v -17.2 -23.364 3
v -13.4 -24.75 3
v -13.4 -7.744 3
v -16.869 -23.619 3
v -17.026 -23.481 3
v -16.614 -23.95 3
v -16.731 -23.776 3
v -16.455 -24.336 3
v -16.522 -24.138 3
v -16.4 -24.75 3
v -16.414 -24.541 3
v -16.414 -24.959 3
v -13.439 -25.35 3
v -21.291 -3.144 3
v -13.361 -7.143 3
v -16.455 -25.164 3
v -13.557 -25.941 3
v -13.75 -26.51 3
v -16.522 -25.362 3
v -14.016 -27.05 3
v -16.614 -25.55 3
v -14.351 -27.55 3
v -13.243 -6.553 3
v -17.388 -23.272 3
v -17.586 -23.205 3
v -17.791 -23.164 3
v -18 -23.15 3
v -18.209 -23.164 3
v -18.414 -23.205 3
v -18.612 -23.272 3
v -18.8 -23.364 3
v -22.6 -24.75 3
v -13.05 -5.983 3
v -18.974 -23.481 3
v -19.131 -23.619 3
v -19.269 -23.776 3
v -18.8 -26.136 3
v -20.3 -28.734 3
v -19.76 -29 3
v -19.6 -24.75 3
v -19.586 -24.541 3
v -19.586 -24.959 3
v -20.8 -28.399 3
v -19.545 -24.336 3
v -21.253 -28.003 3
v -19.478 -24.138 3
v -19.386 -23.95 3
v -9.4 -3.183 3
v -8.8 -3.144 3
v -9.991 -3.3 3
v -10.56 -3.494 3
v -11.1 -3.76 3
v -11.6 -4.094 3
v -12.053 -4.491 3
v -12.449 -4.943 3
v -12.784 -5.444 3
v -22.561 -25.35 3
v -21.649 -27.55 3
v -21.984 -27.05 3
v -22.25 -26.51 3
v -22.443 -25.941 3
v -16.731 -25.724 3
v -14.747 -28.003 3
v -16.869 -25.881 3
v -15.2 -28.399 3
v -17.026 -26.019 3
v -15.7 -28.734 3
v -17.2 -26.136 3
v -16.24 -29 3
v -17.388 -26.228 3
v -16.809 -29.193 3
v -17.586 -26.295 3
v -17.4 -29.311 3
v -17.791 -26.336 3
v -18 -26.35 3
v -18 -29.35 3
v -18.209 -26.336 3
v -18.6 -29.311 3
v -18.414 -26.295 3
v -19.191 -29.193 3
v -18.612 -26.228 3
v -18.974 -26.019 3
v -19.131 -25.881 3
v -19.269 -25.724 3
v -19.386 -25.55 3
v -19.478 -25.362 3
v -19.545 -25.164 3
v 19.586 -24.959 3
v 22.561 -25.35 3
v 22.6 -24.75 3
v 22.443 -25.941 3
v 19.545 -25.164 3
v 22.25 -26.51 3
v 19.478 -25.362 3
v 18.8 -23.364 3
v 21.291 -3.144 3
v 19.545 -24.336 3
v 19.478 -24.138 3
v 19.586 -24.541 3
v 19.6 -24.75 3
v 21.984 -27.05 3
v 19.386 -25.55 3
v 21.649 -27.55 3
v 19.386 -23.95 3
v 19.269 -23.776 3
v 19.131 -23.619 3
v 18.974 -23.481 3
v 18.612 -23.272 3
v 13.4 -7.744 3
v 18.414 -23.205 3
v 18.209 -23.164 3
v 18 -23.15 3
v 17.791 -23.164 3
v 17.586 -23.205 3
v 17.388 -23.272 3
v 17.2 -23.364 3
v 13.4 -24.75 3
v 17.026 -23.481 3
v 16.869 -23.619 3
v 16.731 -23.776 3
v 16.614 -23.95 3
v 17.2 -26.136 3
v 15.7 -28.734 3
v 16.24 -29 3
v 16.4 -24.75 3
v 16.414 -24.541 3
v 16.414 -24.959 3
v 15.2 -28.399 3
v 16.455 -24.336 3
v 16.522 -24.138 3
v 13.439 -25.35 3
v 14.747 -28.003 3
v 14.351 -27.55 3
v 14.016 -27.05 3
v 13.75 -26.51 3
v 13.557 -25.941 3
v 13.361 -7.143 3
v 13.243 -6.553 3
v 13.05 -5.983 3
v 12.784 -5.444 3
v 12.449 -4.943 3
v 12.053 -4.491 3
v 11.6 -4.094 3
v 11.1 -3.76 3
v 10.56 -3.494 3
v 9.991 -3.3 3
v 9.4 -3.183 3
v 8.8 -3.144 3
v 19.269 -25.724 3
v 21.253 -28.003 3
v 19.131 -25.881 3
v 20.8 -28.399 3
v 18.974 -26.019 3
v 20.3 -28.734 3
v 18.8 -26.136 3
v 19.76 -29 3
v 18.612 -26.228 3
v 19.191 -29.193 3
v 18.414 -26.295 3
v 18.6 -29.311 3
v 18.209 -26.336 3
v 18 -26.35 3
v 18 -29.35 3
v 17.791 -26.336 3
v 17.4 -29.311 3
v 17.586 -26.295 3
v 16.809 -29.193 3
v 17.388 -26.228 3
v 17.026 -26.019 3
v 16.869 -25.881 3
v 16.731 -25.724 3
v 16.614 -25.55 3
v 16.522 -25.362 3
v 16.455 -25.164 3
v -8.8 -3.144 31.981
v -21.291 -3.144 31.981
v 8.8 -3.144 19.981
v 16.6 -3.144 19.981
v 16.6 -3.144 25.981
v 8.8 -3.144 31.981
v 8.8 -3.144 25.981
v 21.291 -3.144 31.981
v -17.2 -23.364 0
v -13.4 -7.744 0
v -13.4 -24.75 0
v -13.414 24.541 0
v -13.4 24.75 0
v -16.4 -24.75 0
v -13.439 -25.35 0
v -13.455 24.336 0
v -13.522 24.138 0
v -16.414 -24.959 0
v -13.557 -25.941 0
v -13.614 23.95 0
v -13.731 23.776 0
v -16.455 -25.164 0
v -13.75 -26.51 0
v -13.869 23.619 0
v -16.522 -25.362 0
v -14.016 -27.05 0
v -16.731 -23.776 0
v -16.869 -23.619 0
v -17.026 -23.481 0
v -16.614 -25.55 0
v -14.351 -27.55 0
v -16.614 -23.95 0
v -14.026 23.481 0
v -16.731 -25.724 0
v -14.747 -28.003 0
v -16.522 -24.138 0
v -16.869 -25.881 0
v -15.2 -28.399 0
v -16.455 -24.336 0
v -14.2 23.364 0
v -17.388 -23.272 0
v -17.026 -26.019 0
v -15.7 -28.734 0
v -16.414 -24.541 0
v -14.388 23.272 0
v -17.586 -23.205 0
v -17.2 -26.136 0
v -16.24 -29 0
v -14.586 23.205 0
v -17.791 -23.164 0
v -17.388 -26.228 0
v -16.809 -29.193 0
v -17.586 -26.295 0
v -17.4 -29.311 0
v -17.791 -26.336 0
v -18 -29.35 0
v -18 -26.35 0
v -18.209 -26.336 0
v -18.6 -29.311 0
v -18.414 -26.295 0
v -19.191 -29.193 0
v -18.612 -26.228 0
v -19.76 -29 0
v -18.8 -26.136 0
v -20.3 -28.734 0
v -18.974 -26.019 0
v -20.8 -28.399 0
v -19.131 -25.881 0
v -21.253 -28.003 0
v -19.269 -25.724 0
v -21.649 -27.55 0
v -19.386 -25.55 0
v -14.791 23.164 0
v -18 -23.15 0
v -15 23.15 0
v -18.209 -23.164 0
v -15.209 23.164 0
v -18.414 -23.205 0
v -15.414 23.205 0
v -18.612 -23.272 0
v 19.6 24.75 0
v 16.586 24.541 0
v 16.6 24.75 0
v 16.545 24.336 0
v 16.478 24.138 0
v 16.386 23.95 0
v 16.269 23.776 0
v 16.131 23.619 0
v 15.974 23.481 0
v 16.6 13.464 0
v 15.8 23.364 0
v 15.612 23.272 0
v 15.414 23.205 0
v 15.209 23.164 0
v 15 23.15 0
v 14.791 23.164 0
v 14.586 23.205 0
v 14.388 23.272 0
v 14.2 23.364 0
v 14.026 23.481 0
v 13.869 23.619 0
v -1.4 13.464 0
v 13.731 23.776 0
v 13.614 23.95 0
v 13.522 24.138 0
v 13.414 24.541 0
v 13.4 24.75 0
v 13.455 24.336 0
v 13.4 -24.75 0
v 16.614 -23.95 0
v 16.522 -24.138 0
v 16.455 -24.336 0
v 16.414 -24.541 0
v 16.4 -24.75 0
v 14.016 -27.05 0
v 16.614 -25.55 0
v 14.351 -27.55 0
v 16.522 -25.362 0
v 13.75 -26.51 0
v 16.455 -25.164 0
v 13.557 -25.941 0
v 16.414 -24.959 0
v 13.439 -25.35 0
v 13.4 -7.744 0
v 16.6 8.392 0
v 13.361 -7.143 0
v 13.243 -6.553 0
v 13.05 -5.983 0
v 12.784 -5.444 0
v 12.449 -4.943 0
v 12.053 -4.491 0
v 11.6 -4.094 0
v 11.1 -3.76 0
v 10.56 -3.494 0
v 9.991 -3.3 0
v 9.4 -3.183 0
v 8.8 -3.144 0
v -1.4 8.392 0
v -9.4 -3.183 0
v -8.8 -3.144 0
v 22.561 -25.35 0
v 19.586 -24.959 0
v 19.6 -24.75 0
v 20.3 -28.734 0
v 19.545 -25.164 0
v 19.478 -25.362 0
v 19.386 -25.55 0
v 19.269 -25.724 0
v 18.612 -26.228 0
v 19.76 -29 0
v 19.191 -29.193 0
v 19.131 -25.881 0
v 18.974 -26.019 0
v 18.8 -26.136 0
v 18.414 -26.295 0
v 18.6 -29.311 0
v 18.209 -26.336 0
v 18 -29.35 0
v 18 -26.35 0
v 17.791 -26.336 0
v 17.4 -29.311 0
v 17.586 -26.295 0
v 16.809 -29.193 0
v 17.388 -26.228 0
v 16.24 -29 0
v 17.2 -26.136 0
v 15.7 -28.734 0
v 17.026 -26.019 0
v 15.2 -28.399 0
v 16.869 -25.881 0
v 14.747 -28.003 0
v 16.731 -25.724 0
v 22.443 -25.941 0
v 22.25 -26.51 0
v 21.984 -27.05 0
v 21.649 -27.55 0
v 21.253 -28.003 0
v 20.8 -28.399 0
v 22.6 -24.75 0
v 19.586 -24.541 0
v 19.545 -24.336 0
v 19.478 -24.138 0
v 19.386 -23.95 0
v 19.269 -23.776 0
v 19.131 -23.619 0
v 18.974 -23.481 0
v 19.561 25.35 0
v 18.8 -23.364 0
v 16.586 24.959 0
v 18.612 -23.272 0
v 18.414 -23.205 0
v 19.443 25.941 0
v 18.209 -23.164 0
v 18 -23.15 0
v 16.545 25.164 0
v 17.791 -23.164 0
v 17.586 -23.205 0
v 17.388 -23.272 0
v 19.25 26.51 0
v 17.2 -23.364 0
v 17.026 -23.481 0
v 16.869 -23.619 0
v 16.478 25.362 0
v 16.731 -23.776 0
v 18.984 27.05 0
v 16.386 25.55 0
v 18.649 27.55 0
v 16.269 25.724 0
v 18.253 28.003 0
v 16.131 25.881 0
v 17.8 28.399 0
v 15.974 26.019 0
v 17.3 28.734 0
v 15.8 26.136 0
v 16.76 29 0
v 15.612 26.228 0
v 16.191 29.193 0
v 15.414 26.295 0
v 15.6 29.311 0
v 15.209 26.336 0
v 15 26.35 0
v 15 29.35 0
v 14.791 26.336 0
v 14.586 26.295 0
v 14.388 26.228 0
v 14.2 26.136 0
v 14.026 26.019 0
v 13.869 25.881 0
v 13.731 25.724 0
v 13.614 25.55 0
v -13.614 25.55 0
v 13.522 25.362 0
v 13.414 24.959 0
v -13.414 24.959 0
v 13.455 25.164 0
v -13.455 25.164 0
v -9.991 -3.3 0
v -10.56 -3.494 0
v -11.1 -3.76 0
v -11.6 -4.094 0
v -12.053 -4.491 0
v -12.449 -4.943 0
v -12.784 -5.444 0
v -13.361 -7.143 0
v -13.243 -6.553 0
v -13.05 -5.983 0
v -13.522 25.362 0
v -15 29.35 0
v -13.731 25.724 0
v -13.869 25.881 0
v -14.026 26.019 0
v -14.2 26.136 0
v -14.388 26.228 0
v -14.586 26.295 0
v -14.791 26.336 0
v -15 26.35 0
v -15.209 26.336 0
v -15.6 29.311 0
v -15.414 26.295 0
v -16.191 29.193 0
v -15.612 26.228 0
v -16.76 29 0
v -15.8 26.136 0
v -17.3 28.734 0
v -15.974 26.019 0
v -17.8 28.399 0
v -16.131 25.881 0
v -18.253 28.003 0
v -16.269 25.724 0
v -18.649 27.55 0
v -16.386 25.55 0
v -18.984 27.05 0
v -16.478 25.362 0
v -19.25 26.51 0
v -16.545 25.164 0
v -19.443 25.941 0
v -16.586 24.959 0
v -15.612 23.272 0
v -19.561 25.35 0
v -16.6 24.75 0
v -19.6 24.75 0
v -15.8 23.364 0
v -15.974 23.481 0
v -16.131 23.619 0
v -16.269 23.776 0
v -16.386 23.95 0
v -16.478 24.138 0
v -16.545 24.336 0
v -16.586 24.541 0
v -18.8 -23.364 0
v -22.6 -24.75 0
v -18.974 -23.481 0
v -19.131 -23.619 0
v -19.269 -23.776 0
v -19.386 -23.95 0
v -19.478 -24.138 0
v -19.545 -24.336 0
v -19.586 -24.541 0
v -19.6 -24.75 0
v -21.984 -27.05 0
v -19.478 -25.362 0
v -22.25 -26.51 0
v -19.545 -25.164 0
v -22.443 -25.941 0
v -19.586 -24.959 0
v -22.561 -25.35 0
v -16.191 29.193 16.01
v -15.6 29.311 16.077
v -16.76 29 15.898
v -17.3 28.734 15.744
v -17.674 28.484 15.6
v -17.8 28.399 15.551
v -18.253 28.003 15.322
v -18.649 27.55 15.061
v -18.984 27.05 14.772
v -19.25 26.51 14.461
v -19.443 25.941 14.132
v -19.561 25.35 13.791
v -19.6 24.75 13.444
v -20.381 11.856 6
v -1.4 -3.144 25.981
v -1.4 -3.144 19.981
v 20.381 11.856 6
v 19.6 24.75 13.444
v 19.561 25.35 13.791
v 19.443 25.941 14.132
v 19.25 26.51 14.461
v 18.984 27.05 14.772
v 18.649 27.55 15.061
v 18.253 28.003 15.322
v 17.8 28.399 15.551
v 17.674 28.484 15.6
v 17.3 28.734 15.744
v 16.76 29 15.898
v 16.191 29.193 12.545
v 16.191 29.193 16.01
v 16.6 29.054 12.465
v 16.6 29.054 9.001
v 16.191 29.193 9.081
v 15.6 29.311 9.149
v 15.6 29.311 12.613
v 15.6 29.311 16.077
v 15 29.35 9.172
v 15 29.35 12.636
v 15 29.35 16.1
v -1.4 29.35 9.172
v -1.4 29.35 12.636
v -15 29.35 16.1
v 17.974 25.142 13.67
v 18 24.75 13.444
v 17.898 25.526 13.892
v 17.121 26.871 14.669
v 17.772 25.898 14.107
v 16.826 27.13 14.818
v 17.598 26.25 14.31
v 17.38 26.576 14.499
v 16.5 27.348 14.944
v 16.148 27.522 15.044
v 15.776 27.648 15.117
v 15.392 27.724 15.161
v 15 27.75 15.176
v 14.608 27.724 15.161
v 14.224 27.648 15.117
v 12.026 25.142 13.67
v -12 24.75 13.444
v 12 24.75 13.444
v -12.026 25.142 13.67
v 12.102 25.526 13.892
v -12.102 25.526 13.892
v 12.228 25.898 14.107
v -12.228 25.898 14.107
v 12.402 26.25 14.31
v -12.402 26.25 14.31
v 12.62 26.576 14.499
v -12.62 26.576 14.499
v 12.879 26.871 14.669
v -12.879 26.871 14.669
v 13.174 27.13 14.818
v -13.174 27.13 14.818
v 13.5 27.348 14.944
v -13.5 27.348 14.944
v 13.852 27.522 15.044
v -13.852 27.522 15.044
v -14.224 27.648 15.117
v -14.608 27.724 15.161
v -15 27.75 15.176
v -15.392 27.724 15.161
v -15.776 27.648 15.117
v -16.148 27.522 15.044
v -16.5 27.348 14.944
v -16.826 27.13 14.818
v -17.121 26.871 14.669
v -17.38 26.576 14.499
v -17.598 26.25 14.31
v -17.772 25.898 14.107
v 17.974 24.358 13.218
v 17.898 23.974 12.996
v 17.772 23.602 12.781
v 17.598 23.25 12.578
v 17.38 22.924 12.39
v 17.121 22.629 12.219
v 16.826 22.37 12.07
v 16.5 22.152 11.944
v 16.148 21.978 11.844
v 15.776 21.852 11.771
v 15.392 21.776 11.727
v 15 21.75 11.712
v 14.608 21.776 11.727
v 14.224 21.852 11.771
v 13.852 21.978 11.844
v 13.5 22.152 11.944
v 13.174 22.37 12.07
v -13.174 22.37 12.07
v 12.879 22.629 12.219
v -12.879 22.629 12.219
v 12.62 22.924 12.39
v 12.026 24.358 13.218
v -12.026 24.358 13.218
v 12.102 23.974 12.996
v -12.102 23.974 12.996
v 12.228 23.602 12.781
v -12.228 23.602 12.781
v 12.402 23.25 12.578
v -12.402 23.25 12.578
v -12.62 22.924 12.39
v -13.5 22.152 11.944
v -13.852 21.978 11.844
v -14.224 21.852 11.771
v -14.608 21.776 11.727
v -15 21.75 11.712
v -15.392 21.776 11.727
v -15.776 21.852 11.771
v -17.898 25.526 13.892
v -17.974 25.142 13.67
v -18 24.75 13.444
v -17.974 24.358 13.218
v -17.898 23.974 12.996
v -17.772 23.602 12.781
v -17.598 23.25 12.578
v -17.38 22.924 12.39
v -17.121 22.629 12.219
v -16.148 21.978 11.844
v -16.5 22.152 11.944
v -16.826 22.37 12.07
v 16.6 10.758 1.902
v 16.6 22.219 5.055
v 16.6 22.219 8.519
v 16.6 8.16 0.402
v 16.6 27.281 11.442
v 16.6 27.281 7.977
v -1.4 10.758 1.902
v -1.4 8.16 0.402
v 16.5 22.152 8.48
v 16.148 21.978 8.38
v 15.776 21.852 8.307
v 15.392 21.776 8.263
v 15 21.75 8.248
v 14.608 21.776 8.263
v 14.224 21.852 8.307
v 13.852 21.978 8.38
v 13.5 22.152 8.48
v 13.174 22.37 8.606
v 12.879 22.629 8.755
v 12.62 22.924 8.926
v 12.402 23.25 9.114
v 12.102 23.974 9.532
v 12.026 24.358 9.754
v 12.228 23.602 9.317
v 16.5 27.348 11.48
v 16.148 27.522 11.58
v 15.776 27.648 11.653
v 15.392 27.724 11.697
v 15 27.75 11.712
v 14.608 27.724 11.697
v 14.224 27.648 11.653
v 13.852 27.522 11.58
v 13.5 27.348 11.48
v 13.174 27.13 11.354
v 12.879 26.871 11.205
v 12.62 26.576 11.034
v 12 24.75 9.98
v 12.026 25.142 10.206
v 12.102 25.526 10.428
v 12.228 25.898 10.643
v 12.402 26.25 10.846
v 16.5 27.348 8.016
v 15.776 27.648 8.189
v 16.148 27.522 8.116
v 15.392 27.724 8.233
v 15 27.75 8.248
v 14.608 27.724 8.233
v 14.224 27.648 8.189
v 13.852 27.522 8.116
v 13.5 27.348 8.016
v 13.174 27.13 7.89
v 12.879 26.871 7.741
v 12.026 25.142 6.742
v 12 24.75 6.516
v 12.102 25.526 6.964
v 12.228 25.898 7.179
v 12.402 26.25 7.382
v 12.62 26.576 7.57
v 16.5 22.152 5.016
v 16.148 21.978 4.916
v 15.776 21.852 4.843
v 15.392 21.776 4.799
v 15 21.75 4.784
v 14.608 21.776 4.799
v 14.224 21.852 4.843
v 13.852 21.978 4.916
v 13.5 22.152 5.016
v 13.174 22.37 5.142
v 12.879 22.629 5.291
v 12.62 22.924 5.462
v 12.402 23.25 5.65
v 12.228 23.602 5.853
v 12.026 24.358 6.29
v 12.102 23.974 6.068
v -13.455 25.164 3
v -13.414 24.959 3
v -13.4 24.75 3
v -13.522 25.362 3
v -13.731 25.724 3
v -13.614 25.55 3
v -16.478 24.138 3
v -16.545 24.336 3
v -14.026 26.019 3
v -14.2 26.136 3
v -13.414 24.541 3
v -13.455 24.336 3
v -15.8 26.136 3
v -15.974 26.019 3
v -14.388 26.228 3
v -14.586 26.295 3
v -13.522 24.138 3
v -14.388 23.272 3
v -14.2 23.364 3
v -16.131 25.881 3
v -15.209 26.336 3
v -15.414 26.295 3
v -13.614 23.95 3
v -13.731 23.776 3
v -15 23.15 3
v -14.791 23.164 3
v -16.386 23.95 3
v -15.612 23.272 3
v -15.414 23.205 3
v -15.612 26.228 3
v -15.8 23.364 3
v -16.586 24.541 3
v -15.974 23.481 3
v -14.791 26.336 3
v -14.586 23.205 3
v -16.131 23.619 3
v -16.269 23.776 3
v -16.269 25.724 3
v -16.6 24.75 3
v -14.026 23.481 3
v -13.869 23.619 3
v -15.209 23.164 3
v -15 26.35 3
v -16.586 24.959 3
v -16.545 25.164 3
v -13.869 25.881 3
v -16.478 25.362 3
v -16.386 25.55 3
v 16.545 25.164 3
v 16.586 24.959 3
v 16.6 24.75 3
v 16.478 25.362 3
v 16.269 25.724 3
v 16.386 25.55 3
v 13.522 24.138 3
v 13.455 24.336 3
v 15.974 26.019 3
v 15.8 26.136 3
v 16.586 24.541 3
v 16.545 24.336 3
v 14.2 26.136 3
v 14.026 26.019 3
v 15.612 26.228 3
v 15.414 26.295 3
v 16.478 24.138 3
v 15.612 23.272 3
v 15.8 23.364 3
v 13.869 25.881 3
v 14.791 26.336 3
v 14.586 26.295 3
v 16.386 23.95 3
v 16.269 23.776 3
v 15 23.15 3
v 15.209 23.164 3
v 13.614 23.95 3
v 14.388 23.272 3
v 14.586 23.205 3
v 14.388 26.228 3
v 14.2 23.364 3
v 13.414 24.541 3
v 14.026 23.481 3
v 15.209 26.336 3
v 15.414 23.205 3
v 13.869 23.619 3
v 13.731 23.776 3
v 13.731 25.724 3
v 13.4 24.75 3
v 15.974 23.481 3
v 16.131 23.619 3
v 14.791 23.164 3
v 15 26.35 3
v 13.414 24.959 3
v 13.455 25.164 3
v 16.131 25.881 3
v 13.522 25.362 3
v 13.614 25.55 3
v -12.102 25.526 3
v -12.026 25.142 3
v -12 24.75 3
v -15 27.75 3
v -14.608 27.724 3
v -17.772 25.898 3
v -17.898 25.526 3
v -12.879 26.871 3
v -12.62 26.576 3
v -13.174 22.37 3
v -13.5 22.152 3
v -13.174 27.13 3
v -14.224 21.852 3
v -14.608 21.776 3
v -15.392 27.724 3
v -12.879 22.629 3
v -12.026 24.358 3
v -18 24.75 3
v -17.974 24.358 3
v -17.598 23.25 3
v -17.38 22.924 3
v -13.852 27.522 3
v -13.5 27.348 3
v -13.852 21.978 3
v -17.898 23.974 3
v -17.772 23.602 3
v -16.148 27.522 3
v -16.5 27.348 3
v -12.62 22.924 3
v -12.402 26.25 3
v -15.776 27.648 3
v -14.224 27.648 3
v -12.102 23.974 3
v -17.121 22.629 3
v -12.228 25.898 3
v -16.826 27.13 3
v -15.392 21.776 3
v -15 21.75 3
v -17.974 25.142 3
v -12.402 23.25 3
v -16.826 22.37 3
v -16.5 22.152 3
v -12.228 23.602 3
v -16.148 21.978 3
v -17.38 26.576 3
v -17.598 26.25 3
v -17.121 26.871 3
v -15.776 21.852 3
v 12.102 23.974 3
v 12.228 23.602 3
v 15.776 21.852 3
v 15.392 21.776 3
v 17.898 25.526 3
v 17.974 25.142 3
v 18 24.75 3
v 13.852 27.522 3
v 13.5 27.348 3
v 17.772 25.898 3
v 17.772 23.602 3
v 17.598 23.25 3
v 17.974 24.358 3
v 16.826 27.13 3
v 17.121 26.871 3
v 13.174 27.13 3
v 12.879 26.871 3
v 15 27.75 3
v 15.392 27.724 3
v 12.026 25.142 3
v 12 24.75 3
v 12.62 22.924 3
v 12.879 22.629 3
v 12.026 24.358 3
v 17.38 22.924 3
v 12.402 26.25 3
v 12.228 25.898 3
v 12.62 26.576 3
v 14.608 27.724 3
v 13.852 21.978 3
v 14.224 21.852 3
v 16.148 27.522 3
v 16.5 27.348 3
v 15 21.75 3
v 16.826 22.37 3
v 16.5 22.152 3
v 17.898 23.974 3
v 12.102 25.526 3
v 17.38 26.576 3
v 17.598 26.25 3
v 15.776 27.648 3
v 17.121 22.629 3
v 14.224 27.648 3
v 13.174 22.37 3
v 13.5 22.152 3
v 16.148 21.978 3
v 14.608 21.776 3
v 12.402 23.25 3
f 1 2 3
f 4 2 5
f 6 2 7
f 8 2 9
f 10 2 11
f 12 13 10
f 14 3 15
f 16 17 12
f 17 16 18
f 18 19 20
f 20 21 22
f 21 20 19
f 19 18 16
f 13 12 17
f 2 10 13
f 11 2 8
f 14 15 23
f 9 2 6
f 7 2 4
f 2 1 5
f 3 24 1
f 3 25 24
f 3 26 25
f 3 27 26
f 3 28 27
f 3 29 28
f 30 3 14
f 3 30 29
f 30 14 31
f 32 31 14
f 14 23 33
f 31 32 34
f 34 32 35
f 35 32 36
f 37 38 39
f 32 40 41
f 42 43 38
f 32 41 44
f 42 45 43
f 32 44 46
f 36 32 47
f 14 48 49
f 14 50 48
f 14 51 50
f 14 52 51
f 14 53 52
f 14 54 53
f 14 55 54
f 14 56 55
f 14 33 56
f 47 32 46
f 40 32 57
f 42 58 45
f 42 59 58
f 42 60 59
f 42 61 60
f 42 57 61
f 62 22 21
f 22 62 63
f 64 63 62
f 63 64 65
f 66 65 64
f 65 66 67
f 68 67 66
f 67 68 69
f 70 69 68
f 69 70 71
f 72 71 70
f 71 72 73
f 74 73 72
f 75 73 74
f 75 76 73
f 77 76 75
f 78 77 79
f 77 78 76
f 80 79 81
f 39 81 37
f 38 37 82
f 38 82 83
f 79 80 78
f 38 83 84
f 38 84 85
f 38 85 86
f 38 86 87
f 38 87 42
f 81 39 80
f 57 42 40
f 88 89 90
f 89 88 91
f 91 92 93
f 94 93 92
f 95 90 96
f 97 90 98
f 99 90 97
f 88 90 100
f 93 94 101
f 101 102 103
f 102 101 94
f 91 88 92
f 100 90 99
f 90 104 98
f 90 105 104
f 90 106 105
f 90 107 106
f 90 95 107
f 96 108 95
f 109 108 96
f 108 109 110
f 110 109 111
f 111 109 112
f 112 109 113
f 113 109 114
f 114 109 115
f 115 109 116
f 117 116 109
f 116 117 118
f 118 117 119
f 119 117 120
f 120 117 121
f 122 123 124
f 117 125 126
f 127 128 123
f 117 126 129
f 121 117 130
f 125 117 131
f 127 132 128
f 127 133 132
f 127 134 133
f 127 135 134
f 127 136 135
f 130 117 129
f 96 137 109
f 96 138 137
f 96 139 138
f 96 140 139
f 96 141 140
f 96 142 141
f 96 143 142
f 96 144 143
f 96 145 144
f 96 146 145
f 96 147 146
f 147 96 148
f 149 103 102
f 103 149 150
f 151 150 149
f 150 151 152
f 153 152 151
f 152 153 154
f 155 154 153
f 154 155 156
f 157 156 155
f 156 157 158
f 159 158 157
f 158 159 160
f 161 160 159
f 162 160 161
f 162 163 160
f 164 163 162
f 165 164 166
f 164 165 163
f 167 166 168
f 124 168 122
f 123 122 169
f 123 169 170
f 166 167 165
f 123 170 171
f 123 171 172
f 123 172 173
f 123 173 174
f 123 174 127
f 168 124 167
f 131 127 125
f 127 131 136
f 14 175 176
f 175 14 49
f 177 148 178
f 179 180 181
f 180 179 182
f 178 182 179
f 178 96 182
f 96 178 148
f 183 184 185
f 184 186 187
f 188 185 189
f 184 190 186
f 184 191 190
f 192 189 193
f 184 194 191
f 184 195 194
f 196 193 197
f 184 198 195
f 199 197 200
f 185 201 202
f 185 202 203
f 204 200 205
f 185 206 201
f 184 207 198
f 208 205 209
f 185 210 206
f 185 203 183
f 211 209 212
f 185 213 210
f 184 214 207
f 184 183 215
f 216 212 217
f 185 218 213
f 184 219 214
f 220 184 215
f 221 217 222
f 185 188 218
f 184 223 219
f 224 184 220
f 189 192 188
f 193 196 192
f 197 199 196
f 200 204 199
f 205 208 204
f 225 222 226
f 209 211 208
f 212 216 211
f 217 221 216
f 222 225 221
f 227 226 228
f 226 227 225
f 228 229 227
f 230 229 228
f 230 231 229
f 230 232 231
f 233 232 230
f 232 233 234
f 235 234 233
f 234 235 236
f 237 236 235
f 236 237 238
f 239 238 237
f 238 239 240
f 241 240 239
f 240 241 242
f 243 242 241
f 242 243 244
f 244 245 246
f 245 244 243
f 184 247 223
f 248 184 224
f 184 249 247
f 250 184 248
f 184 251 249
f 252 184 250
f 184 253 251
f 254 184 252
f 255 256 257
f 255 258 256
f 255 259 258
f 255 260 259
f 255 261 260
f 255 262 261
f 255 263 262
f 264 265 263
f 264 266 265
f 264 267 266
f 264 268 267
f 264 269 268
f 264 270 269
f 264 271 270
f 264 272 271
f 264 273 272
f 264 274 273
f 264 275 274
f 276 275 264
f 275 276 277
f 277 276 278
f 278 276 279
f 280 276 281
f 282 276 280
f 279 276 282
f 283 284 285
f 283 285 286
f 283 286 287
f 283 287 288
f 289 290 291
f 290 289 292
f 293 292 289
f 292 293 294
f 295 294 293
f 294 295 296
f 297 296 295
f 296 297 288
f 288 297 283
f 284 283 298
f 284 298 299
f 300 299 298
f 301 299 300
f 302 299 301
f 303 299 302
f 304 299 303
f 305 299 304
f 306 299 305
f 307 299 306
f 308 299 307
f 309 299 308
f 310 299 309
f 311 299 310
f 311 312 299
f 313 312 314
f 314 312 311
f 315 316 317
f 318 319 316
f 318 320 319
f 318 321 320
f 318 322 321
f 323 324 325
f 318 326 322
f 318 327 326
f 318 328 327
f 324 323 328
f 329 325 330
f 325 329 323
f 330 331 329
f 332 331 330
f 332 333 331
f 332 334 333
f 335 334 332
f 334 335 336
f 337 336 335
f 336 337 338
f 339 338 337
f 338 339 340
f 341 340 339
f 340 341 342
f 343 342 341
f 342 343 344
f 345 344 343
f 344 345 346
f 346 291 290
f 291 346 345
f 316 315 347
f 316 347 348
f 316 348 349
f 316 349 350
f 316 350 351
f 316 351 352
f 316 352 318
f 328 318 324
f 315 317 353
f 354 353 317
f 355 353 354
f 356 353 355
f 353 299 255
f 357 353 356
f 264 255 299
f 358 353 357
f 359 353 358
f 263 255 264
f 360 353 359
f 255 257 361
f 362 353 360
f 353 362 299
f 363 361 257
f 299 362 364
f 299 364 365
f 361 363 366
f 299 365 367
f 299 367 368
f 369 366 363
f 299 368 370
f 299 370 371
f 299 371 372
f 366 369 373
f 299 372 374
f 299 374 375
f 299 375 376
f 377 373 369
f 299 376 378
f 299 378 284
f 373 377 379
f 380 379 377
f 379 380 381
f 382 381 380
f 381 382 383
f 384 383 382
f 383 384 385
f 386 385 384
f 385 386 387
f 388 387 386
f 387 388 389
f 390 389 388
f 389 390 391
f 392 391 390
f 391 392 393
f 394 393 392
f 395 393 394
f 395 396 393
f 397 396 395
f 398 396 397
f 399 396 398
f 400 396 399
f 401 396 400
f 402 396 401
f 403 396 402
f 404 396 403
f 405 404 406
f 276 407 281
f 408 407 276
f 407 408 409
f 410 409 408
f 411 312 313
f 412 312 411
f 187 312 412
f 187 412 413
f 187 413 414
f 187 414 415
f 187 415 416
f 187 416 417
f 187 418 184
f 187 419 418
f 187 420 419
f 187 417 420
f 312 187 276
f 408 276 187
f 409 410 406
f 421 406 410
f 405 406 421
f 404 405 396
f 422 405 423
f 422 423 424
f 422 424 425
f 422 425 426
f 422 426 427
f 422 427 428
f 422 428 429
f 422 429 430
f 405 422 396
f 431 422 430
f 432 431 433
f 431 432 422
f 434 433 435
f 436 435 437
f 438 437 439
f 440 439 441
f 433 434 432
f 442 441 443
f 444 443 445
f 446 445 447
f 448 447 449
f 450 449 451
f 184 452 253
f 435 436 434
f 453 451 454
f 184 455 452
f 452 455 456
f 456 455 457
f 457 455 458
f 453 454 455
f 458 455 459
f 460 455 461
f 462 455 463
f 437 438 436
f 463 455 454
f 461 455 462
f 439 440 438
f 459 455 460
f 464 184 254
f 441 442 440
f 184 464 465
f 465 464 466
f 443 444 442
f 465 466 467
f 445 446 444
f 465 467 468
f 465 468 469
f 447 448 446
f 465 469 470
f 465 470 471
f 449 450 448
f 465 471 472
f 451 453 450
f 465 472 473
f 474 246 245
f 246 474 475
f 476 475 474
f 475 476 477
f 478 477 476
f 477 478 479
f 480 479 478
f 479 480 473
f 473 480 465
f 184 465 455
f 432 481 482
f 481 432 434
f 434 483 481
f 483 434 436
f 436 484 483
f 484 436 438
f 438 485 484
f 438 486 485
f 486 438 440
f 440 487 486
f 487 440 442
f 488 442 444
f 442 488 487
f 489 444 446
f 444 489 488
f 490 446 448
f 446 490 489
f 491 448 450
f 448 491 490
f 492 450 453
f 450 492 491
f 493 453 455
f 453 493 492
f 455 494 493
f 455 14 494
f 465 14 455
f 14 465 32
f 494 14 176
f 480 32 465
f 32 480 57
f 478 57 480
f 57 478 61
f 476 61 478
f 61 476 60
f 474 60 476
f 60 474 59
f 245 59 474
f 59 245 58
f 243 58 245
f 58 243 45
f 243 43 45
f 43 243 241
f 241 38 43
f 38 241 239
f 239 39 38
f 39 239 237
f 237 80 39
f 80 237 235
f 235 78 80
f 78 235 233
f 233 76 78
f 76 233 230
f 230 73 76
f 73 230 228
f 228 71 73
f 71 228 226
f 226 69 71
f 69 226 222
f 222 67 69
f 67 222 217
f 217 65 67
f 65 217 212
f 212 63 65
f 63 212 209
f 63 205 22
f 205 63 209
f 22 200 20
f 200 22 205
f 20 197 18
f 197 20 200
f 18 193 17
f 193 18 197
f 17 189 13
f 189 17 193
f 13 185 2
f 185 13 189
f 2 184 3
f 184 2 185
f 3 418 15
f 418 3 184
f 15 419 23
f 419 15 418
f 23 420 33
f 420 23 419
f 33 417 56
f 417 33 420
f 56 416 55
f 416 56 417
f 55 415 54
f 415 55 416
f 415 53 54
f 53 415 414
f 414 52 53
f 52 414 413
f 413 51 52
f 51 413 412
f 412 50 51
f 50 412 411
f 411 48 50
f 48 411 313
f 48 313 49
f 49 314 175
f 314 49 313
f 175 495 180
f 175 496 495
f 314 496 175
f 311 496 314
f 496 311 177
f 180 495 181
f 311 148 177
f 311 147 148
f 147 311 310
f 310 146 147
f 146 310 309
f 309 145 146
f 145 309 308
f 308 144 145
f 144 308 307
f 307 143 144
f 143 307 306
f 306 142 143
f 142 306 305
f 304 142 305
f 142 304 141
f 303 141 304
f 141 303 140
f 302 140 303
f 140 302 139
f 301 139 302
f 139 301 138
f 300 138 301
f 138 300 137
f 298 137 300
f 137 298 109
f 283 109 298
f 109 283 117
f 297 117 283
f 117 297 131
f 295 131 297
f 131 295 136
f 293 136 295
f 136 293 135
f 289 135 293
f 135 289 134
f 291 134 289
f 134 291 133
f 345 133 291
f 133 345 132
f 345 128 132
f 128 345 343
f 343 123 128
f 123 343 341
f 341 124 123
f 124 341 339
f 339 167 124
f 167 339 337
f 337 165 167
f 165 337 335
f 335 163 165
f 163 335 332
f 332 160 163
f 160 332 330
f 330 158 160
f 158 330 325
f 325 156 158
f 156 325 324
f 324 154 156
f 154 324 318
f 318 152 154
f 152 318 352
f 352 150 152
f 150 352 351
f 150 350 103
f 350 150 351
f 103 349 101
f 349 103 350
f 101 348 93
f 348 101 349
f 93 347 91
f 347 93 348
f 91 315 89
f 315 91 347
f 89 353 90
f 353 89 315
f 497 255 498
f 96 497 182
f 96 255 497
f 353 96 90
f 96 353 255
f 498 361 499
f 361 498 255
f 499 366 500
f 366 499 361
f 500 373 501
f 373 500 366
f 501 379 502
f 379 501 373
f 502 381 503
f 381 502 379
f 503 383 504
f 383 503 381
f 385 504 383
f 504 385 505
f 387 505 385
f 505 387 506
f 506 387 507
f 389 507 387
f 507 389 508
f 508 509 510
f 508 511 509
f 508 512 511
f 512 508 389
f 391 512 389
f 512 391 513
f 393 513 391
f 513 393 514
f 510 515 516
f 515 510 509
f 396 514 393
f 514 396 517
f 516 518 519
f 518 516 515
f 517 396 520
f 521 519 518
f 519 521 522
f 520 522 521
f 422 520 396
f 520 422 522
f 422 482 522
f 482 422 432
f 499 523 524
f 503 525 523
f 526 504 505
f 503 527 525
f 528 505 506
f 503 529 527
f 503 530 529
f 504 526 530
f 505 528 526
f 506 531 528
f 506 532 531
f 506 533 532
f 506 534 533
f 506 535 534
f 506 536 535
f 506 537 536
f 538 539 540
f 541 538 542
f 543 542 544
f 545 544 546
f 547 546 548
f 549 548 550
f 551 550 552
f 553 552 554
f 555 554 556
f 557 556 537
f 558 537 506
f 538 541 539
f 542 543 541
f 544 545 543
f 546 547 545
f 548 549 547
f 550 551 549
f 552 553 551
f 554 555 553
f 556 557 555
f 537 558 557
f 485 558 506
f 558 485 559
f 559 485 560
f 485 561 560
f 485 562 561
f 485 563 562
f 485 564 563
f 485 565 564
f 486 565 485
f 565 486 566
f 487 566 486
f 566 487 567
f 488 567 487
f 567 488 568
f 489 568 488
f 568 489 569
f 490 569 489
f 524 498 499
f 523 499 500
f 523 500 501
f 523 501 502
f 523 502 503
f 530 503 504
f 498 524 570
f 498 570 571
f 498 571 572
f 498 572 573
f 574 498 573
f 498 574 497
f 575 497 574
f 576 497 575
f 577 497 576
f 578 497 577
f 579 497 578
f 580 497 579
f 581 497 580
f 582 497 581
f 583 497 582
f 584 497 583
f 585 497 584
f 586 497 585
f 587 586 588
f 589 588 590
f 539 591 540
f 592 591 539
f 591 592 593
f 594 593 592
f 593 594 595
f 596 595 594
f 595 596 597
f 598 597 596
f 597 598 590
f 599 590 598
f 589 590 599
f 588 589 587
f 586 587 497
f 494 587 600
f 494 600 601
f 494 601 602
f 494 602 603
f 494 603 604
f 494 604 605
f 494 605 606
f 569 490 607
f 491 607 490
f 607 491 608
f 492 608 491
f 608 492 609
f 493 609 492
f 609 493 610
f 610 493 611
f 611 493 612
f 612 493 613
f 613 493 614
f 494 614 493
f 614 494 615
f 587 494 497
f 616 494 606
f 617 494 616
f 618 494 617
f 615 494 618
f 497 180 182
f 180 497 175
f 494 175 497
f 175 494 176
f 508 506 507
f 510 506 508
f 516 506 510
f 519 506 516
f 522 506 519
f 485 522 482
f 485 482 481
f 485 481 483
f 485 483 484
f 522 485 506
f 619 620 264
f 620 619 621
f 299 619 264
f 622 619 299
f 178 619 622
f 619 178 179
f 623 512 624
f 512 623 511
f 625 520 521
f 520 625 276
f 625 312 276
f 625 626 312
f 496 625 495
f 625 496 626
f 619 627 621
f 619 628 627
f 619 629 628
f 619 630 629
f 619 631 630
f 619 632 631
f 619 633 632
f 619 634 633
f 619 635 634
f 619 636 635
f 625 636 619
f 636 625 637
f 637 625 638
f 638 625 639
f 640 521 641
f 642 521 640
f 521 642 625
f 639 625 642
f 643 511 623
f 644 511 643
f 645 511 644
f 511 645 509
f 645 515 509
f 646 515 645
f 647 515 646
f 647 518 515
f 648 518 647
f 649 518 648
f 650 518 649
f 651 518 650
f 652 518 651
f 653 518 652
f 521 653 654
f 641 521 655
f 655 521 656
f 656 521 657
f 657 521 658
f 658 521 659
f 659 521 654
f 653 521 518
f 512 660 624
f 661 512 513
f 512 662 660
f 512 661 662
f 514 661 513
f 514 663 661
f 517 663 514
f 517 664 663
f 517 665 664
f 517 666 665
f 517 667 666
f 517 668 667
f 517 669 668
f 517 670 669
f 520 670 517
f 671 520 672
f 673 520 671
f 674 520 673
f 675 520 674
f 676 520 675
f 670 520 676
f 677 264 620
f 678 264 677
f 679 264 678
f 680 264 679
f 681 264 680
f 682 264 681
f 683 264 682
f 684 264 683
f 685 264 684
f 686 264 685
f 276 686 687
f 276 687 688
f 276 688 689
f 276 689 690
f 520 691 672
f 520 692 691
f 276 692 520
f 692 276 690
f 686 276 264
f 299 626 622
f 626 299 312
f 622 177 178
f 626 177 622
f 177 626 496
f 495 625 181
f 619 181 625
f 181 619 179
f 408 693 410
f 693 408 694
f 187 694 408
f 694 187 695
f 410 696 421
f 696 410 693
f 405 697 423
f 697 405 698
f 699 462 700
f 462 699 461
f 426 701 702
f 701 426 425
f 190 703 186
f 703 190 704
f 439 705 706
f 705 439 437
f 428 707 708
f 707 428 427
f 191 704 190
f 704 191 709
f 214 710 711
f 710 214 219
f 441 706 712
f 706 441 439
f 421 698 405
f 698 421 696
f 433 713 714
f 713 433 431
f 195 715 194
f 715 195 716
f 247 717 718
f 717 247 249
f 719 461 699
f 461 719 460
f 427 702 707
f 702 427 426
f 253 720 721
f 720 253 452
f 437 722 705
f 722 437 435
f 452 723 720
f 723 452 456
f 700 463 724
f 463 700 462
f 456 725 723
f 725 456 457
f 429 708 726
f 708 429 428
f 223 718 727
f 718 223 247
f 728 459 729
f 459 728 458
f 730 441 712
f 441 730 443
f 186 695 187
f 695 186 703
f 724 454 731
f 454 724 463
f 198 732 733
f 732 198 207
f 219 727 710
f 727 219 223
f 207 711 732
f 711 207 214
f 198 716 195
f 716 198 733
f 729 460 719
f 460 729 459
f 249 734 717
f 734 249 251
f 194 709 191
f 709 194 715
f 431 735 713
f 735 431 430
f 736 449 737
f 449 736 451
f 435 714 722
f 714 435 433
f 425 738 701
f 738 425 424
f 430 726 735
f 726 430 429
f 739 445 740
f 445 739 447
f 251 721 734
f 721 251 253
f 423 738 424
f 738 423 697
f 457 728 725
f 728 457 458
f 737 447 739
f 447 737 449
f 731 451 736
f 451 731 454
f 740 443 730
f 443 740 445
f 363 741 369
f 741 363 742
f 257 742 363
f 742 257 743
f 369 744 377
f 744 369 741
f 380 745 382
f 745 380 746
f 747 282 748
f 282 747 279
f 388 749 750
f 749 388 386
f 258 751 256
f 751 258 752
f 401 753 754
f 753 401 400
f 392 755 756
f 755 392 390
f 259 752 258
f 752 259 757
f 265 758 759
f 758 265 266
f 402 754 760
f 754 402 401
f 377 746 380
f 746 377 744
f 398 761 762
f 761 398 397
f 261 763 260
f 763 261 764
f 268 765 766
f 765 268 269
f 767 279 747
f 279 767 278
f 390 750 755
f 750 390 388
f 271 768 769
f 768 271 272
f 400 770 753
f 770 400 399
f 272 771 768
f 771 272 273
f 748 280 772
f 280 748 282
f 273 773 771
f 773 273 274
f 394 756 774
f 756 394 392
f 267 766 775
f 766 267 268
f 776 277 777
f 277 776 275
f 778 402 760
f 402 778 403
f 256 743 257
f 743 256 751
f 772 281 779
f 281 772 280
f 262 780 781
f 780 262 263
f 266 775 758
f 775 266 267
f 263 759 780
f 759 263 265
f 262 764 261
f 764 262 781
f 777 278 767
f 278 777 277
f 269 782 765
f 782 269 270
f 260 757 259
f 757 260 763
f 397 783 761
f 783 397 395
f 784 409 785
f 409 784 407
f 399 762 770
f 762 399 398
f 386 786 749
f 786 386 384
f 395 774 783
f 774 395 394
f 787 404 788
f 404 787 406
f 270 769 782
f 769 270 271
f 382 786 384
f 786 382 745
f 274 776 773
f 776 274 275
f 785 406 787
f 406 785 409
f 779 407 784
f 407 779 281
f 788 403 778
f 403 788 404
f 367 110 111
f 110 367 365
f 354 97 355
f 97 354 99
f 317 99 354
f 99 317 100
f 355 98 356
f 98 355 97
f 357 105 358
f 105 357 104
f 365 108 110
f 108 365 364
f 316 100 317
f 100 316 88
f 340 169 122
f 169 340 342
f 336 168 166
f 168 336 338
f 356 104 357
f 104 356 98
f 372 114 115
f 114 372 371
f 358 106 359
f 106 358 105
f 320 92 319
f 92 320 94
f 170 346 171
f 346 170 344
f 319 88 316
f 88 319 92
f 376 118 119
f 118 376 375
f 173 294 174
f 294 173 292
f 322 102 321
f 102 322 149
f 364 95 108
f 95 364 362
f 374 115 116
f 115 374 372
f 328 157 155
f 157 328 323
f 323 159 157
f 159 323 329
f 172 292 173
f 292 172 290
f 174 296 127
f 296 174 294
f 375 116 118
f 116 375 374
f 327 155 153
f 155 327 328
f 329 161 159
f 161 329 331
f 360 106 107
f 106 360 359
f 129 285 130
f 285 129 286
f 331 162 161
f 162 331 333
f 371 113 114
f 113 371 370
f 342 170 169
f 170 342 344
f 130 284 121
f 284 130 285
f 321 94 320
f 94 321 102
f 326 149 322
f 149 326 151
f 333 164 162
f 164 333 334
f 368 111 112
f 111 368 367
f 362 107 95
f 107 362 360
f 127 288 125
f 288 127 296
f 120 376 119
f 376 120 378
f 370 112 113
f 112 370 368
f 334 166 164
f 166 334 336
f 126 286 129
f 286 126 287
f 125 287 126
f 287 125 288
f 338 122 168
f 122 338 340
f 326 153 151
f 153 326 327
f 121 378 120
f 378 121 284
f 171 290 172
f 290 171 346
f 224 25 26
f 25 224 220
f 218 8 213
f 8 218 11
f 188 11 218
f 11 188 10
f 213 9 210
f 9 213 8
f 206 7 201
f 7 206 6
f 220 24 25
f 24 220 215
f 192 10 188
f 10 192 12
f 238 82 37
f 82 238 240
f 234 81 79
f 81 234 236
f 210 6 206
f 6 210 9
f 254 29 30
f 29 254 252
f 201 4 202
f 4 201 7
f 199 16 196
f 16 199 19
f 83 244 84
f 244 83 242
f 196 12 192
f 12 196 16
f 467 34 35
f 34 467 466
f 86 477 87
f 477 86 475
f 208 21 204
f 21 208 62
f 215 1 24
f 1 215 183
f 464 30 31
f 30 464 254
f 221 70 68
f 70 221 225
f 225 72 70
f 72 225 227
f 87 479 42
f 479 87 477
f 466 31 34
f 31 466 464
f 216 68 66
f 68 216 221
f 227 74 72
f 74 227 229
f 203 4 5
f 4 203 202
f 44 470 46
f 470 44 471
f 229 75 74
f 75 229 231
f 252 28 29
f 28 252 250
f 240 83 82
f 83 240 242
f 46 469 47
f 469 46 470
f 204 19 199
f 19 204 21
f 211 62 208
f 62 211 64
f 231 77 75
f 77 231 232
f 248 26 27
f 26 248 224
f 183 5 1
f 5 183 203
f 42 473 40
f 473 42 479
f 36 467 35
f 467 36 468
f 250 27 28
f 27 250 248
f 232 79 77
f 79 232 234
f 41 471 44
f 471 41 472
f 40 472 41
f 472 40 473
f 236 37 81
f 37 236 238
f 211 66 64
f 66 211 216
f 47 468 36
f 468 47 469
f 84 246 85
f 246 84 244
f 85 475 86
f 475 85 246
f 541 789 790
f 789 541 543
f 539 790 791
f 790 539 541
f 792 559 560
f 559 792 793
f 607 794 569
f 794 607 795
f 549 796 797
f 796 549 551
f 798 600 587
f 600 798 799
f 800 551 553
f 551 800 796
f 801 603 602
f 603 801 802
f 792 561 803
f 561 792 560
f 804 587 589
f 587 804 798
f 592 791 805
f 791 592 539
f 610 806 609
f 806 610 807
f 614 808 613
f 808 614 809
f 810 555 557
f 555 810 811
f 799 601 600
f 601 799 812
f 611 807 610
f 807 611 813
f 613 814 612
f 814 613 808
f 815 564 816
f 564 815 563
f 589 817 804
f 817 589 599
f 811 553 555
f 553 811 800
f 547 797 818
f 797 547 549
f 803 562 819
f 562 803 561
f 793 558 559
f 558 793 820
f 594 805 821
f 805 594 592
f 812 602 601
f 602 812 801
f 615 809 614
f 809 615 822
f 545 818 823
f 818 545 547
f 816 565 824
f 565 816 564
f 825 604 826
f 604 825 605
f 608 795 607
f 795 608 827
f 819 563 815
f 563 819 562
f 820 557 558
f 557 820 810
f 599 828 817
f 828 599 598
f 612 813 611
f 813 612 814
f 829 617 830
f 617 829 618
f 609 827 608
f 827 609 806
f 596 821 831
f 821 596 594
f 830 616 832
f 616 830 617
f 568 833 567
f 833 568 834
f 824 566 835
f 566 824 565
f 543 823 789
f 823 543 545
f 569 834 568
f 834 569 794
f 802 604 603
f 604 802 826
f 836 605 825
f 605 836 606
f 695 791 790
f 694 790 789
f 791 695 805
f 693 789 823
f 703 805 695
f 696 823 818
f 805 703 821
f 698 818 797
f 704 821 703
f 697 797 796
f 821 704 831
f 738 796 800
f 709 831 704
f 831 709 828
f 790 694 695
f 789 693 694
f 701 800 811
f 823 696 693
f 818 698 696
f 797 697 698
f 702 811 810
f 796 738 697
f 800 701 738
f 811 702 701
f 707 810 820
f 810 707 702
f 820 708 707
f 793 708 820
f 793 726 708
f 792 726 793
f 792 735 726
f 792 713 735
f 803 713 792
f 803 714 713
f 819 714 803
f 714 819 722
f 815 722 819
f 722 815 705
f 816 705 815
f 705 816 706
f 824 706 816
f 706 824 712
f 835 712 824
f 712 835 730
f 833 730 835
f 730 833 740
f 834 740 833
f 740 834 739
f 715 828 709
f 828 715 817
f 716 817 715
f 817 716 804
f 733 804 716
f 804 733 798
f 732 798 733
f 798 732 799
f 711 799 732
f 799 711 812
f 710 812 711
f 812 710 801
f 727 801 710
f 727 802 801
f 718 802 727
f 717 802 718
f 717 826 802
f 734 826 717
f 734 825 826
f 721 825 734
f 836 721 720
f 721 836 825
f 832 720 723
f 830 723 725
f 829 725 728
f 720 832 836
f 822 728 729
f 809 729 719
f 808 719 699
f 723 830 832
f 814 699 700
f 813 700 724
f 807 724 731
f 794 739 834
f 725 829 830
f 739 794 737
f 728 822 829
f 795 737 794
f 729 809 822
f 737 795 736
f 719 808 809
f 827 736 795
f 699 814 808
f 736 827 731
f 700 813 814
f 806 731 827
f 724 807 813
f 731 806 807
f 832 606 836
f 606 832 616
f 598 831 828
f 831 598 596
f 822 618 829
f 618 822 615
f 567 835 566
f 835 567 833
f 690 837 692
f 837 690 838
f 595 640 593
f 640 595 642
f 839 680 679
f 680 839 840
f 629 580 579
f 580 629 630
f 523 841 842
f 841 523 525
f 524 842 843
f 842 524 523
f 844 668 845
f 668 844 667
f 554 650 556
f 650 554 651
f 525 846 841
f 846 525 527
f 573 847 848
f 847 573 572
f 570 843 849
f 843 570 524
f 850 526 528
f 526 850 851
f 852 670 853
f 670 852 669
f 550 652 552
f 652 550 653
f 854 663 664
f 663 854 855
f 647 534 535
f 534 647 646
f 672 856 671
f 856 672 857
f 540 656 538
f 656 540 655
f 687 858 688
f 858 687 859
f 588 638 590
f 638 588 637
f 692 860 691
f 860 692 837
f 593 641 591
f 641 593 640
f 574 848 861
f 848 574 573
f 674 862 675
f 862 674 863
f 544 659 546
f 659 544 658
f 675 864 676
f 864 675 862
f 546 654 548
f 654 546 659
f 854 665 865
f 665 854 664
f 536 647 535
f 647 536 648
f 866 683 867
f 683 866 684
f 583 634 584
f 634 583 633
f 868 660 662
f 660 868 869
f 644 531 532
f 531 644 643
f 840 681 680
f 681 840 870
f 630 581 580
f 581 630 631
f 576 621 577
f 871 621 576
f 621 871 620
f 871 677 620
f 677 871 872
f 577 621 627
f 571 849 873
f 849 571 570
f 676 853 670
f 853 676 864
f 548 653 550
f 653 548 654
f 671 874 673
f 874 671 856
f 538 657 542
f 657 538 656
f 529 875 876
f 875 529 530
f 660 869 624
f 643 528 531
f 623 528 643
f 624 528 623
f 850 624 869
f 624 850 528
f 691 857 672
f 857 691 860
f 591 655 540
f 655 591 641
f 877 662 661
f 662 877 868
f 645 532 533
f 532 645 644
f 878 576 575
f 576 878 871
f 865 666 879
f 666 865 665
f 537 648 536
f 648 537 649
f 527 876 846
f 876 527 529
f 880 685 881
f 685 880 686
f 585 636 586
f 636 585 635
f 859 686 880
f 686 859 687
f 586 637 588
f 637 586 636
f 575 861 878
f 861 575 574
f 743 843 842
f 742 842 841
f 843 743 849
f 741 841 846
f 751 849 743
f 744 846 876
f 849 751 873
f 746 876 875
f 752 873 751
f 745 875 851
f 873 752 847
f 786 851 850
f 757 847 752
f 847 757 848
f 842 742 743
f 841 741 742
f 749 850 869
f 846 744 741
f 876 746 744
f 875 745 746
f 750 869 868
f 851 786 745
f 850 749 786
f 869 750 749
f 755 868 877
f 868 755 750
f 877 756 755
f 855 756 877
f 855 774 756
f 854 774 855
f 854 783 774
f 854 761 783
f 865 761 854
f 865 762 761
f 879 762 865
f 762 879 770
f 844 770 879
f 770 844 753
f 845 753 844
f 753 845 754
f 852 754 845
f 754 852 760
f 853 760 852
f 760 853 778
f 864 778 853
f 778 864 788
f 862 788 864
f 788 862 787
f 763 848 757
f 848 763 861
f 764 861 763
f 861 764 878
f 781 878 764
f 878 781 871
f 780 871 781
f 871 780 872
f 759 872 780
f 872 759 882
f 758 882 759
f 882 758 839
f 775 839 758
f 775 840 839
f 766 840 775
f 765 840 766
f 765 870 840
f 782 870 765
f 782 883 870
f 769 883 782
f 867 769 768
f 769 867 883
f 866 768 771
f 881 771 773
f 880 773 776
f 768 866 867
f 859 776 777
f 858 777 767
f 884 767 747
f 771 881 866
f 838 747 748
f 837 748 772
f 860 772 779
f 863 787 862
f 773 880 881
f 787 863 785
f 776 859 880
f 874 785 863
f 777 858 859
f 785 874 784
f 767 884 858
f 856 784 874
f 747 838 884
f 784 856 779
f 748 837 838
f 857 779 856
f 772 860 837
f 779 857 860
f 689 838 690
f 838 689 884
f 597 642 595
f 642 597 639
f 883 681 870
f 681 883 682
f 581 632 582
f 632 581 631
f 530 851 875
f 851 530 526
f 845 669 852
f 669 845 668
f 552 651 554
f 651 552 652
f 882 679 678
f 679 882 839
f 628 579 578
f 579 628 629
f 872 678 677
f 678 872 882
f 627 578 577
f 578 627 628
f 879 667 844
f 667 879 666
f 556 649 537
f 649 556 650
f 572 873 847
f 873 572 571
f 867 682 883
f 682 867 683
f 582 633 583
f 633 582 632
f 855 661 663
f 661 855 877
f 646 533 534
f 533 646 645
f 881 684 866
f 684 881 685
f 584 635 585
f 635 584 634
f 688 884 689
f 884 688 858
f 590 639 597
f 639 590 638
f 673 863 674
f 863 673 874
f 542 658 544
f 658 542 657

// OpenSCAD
//Depth of camera
camera_depth = 20.2;
//Height of the supporting back
back_height = 30;
//C/C Distance between front holes
front_cc = 30;
//C/C Distance between rear holes
rear_cc = 36;
//C/C Distance between front and rear holes
front_rear_cc = 49.5;
//angle of camera
angle = 30; //[10:45]
//Thickness of the base
base_thickness = 3;
//Hole diameter (may need adjustment depending on printer)
hole_size = 3.2;
//Determines the amount of "meat" around the holes
edge_margin = 3;
//Diameter of screw head (to allow enough clerance)
screw_head_size = 6;
//Wedge offset from front
front_offset = 0;
//Add lip to fron of wedge
use_lip = "No"; //[Yes,No]
//Velcro strap width
velcro_width = 18;
//Velcro strap thickness
velcro_thickness = 3;
//Added height under the camera e.g. for prop clearence
added_height = 0;


//Calculated variables wont be visible to Thingiverse customizer
hole_clearence = edge_margin+hole_size/2;
screw_head_clerance = screw_head_size / 2;
hole_radius = hole_size / 2;
lip_thickness = use_lip == "Yes" ? 2*1 : 0*1;
lip_height =  use_lip == "Yes" ? 2*1 : 0*1;

//internal global varaibles
_xFrontOffset = front_cc/2;
_xRearOffset = rear_cc/2;
_xTotFrontOffset = front_cc/2+hole_clearence;
_xTotRearOffset = rear_cc/2+hole_clearence;
_yOffset = front_rear_cc/2;
_yTotOffset = front_rear_cc/2+hole_clearence;
_cameraHolderDepth = (lip_thickness+camera_depth)*cos(angle)+back_height*sin(angle)+lip_thickness;
_cameraHolderHeight = back_height*cos(angle) + base_thickness + velcro_thickness + added_height;
_wedgeStartYoffset = _yTotOffset - front_offset;
_wedgeEndYoffset = _yTotOffset - front_offset - _cameraHolderDepth;
_rearSpaceLeft = _yTotOffset * 2 - front_offset - _cameraHolderDepth;
_totWidth = front_cc > rear_cc ? front_cc + hole_clearence*2 : rear_cc + hole_clearence*2;
_velcroXpos = (velcro_width + edge_margin) < (front_cc+2*edge_margin+hole_size) / 2 ? 0 :  ((front_cc+2*edge_margin+hole_size) / 2 )-(velcro_width + edge_margin);

module createBase()
{   
           
    difference()
    {
        linear_extrude( height = _cameraHolderHeight)
        {
            union()
            {
                if( front_offset > 0 )
                {
                    polygon(
                                points = [  [-_xTotFrontOffset, _yOffset],
                                            [-_xFrontOffset+hole_clearence, _yOffset],
                                            [-_xFrontOffset+hole_clearence, _wedgeStartYoffset],
                                            [_xFrontOffset-hole_clearence, _wedgeStartYoffset],
                                            [_xFrontOffset-hole_clearence, _yOffset],
                                            [_xTotFrontOffset, _yOffset], 
                                            [_xTotRearOffset, -_yOffset], 
                                            [_xRearOffset-hole_clearence, -_yOffset], 
                                            [_xRearOffset-hole_clearence, _wedgeEndYoffset], 
                                            [-_xRearOffset+hole_clearence, _wedgeEndYoffset], 
                                            [-_xRearOffset+hole_clearence, -_yOffset], 
                                            [-_xTotRearOffset, -_yOffset] ], 
                                convexity = 10);
                } else {
                    polygon(
                                points = [  [-_xFrontOffset, _yOffset+hole_clearence],                                        [_xFrontOffset, _yOffset+hole_clearence], 
                                            [_xTotFrontOffset, _yOffset], 
                                            [_xTotRearOffset, -_yOffset], 
                                            [_xRearOffset-hole_clearence, -_yOffset], 
                                            [_xRearOffset-hole_clearence, _wedgeEndYoffset], 
                                            [-_xRearOffset+hole_clearence, _wedgeEndYoffset], 
                                            [-_xRearOffset+hole_clearence, -_yOffset], 
                                            [-_xTotRearOffset, -_yOffset],
                                            [-_xTotFrontOffset, _yOffset]],
                                convexity = 10);
                }
                translate([-_xFrontOffset, _yOffset, 0])
                circle(r=hole_clearence, center = false); 
                translate([_xFrontOffset, _yOffset, 0])
                circle(r=hole_clearence, center = false); 
                translate([_xRearOffset, -_yOffset, 0])
                circle(r=hole_clearence, center = false); 
                translate([-_xRearOffset, -_yOffset, 0])
                circle(r=hole_clearence, center = false); 
                if(front_offset > hole_clearence*2)
                {
                    difference()
                    {
                        union()
                        {
                            translate([_xFrontOffset-hole_clearence*2, _wedgeStartYoffset, 0])
                            square([hole_clearence,hole_clearence]);
                            translate([-_xFrontOffset+hole_clearence, _wedgeStartYoffset, 0])
                            square([hole_clearence,hole_clearence]);
                        }
                        union()
                        {
                            translate([_xFrontOffset-hole_clearence*2, _wedgeStartYoffset+hole_clearence, 0])
                            circle(r=hole_clearence, center = false); 
                            translate([-_xFrontOffset+hole_clearence*2, _wedgeStartYoffset+hole_clearence, 0])                circle(r=hole_clearence, center = false);   
                        }
                    }
                }
                if((_yTotOffset + _wedgeEndYoffset) > hole_clearence*2)
                {
                    difference()
                    {
                        union()
                        {
                            translate([_xRearOffset-hole_clearence*2, _wedgeEndYoffset-hole_clearence, 0])
                            square([hole_clearence,hole_clearence]);
                            translate([-_xRearOffset+hole_clearence, _wedgeEndYoffset-hole_clearence, 0])
                            square([hole_clearence,hole_clearence]);
                            
                        }
                        union()
                        {
                            translate([_xRearOffset-hole_clearence*2, _wedgeEndYoffset-hole_clearence, 0])
                            circle(r=hole_clearence, center = false); 
                            translate([-_xRearOffset+hole_clearence*2, _wedgeEndYoffset-hole_clearence, 0])
                            circle(r=hole_clearence, center = false); 
                        }
                    }
                }
            }
        }
        union()
        {
            translate([-_totWidth/2, _wedgeStartYoffset, base_thickness])
            cube([_totWidth,front_rear_cc,_cameraHolderHeight], center = false);
            rearSpace = _yTotOffset + _wedgeEndYoffset;
            translate([-_totWidth/2, _wedgeEndYoffset-rearSpace, base_thickness])
            cube([_totWidth,rearSpace,_cameraHolderHeight], center = false);
        }
    }    
}

module addWedge()
{
    totWidth = front_cc > rear_cc ? front_cc + edge_margin*2+hole_size: rear_cc + edge_margin*2+hole_size;
                xOffset = totWidth/2;  
    difference()
    {
        difference()
        {
            children();
            union()
            {
                          
                yOffset = (front_rear_cc/2+edge_margin+hole_size/2)-(lip_thickness+camera_depth)*cos(angle) -front_offset;
                translate([-xOffset, yOffset, base_thickness+velcro_thickness+added_height])
                rotate([angle,0,0])
                cube([totWidth, camera_depth, back_height+5], center = false);
                
            }
        }
       
        union()
       {
           yOffset = (front_rear_cc/2+edge_margin+hole_size/2)-lip_thickness*cos(angle) -front_offset; 
                zOffset = base_thickness+velcro_thickness + camera_depth*sin(angle) + added_height;
                translate([-xOffset, yOffset, zOffset])
                rotate([angle,0,0])
                translate([0, -1, lip_height])
                cube([totWidth, front_rear_cc, back_height+5], center = false);
                translate([-xOffset, yOffset, zOffset])
                rotate([angle,0,0])
                translate([0, lip_thickness, 0])
                cube([totWidth, front_rear_cc, back_height+5], center = false);
       }
    }
}

module addStrapHole()
{
    difference()
    {
        children();
        union()
        {
            yOffset = (front_rear_cc/2+edge_margin+hole_size/2)-lip_thickness*cos(angle) -front_offset; 
            zOffset = base_thickness+velcro_thickness + camera_depth*sin(angle);
            translate([0, yOffset, zOffset+added_height])
            rotate([angle,0,0])
            translate([_velcroXpos, 0, -zOffset+base_thickness])
            cube([velcro_width, lip_thickness+1, zOffset*2], center = false);
            ySize = camera_depth + base_thickness + velcro_thickness;
            translate([0, yOffset, zOffset])
            rotate([angle,0,0])            
            translate([_velcroXpos, -ySize, -base_thickness-velcro_thickness])
            cube([velcro_width, ySize+1, velcro_thickness], center = false);
            translate([0, yOffset, zOffset])
            rotate([angle,0,0])            
            translate([_velcroXpos, -ySize, -base_thickness-velcro_thickness])            
            cube([velcro_width, velcro_thickness, back_height*1.5], center = false);
            
        }
    }
}

module clearForScrews()
{
    xOffsetFront = front_cc/2;
    xOffsetRear = rear_cc/2;
    yOffset = front_rear_cc/2;
    
    difference()
    {
        children();
        union()
        {
            //Screw holes
            translate([-xOffsetFront, yOffset, (base_thickness+1)/2])
            cylinder(h=base_thickness+1, r=hole_radius, center = true); 
            translate([xOffsetFront, yOffset, (base_thickness+1)/2])
            cylinder(h=base_thickness+1, r=hole_radius, center = true); 
            translate([xOffsetRear, -yOffset, (base_thickness+1)/2])
            cylinder(h=base_thickness+1, r=hole_radius, center = true); 
            translate([-xOffsetRear, -yOffset, (base_thickness+1)/2])
            cylinder(h=base_thickness+1, r=hole_radius, center = true); 
            translate([xOffsetRear, -yOffset, 50+base_thickness])
            cylinder(h=100, r=screw_head_clerance, center = true);        translate([-xOffsetRear, -yOffset, 50+base_thickness])
            cylinder(h=100, r=screw_head_clerance, center = true);
            translate([-xOffsetFront, yOffset, 50+base_thickness])
            cylinder(h=100, r=screw_head_clerance, center = true);
            translate([xOffsetFront, yOffset, 50+base_thickness])
            cylinder(h=100, r=screw_head_clerance, center = true);             
        }
    }
}


$fn = 48;
clearForScrews()
{
    addStrapHole()
    {
        addWedge()
        {
            createBase();
        }
    }
}
